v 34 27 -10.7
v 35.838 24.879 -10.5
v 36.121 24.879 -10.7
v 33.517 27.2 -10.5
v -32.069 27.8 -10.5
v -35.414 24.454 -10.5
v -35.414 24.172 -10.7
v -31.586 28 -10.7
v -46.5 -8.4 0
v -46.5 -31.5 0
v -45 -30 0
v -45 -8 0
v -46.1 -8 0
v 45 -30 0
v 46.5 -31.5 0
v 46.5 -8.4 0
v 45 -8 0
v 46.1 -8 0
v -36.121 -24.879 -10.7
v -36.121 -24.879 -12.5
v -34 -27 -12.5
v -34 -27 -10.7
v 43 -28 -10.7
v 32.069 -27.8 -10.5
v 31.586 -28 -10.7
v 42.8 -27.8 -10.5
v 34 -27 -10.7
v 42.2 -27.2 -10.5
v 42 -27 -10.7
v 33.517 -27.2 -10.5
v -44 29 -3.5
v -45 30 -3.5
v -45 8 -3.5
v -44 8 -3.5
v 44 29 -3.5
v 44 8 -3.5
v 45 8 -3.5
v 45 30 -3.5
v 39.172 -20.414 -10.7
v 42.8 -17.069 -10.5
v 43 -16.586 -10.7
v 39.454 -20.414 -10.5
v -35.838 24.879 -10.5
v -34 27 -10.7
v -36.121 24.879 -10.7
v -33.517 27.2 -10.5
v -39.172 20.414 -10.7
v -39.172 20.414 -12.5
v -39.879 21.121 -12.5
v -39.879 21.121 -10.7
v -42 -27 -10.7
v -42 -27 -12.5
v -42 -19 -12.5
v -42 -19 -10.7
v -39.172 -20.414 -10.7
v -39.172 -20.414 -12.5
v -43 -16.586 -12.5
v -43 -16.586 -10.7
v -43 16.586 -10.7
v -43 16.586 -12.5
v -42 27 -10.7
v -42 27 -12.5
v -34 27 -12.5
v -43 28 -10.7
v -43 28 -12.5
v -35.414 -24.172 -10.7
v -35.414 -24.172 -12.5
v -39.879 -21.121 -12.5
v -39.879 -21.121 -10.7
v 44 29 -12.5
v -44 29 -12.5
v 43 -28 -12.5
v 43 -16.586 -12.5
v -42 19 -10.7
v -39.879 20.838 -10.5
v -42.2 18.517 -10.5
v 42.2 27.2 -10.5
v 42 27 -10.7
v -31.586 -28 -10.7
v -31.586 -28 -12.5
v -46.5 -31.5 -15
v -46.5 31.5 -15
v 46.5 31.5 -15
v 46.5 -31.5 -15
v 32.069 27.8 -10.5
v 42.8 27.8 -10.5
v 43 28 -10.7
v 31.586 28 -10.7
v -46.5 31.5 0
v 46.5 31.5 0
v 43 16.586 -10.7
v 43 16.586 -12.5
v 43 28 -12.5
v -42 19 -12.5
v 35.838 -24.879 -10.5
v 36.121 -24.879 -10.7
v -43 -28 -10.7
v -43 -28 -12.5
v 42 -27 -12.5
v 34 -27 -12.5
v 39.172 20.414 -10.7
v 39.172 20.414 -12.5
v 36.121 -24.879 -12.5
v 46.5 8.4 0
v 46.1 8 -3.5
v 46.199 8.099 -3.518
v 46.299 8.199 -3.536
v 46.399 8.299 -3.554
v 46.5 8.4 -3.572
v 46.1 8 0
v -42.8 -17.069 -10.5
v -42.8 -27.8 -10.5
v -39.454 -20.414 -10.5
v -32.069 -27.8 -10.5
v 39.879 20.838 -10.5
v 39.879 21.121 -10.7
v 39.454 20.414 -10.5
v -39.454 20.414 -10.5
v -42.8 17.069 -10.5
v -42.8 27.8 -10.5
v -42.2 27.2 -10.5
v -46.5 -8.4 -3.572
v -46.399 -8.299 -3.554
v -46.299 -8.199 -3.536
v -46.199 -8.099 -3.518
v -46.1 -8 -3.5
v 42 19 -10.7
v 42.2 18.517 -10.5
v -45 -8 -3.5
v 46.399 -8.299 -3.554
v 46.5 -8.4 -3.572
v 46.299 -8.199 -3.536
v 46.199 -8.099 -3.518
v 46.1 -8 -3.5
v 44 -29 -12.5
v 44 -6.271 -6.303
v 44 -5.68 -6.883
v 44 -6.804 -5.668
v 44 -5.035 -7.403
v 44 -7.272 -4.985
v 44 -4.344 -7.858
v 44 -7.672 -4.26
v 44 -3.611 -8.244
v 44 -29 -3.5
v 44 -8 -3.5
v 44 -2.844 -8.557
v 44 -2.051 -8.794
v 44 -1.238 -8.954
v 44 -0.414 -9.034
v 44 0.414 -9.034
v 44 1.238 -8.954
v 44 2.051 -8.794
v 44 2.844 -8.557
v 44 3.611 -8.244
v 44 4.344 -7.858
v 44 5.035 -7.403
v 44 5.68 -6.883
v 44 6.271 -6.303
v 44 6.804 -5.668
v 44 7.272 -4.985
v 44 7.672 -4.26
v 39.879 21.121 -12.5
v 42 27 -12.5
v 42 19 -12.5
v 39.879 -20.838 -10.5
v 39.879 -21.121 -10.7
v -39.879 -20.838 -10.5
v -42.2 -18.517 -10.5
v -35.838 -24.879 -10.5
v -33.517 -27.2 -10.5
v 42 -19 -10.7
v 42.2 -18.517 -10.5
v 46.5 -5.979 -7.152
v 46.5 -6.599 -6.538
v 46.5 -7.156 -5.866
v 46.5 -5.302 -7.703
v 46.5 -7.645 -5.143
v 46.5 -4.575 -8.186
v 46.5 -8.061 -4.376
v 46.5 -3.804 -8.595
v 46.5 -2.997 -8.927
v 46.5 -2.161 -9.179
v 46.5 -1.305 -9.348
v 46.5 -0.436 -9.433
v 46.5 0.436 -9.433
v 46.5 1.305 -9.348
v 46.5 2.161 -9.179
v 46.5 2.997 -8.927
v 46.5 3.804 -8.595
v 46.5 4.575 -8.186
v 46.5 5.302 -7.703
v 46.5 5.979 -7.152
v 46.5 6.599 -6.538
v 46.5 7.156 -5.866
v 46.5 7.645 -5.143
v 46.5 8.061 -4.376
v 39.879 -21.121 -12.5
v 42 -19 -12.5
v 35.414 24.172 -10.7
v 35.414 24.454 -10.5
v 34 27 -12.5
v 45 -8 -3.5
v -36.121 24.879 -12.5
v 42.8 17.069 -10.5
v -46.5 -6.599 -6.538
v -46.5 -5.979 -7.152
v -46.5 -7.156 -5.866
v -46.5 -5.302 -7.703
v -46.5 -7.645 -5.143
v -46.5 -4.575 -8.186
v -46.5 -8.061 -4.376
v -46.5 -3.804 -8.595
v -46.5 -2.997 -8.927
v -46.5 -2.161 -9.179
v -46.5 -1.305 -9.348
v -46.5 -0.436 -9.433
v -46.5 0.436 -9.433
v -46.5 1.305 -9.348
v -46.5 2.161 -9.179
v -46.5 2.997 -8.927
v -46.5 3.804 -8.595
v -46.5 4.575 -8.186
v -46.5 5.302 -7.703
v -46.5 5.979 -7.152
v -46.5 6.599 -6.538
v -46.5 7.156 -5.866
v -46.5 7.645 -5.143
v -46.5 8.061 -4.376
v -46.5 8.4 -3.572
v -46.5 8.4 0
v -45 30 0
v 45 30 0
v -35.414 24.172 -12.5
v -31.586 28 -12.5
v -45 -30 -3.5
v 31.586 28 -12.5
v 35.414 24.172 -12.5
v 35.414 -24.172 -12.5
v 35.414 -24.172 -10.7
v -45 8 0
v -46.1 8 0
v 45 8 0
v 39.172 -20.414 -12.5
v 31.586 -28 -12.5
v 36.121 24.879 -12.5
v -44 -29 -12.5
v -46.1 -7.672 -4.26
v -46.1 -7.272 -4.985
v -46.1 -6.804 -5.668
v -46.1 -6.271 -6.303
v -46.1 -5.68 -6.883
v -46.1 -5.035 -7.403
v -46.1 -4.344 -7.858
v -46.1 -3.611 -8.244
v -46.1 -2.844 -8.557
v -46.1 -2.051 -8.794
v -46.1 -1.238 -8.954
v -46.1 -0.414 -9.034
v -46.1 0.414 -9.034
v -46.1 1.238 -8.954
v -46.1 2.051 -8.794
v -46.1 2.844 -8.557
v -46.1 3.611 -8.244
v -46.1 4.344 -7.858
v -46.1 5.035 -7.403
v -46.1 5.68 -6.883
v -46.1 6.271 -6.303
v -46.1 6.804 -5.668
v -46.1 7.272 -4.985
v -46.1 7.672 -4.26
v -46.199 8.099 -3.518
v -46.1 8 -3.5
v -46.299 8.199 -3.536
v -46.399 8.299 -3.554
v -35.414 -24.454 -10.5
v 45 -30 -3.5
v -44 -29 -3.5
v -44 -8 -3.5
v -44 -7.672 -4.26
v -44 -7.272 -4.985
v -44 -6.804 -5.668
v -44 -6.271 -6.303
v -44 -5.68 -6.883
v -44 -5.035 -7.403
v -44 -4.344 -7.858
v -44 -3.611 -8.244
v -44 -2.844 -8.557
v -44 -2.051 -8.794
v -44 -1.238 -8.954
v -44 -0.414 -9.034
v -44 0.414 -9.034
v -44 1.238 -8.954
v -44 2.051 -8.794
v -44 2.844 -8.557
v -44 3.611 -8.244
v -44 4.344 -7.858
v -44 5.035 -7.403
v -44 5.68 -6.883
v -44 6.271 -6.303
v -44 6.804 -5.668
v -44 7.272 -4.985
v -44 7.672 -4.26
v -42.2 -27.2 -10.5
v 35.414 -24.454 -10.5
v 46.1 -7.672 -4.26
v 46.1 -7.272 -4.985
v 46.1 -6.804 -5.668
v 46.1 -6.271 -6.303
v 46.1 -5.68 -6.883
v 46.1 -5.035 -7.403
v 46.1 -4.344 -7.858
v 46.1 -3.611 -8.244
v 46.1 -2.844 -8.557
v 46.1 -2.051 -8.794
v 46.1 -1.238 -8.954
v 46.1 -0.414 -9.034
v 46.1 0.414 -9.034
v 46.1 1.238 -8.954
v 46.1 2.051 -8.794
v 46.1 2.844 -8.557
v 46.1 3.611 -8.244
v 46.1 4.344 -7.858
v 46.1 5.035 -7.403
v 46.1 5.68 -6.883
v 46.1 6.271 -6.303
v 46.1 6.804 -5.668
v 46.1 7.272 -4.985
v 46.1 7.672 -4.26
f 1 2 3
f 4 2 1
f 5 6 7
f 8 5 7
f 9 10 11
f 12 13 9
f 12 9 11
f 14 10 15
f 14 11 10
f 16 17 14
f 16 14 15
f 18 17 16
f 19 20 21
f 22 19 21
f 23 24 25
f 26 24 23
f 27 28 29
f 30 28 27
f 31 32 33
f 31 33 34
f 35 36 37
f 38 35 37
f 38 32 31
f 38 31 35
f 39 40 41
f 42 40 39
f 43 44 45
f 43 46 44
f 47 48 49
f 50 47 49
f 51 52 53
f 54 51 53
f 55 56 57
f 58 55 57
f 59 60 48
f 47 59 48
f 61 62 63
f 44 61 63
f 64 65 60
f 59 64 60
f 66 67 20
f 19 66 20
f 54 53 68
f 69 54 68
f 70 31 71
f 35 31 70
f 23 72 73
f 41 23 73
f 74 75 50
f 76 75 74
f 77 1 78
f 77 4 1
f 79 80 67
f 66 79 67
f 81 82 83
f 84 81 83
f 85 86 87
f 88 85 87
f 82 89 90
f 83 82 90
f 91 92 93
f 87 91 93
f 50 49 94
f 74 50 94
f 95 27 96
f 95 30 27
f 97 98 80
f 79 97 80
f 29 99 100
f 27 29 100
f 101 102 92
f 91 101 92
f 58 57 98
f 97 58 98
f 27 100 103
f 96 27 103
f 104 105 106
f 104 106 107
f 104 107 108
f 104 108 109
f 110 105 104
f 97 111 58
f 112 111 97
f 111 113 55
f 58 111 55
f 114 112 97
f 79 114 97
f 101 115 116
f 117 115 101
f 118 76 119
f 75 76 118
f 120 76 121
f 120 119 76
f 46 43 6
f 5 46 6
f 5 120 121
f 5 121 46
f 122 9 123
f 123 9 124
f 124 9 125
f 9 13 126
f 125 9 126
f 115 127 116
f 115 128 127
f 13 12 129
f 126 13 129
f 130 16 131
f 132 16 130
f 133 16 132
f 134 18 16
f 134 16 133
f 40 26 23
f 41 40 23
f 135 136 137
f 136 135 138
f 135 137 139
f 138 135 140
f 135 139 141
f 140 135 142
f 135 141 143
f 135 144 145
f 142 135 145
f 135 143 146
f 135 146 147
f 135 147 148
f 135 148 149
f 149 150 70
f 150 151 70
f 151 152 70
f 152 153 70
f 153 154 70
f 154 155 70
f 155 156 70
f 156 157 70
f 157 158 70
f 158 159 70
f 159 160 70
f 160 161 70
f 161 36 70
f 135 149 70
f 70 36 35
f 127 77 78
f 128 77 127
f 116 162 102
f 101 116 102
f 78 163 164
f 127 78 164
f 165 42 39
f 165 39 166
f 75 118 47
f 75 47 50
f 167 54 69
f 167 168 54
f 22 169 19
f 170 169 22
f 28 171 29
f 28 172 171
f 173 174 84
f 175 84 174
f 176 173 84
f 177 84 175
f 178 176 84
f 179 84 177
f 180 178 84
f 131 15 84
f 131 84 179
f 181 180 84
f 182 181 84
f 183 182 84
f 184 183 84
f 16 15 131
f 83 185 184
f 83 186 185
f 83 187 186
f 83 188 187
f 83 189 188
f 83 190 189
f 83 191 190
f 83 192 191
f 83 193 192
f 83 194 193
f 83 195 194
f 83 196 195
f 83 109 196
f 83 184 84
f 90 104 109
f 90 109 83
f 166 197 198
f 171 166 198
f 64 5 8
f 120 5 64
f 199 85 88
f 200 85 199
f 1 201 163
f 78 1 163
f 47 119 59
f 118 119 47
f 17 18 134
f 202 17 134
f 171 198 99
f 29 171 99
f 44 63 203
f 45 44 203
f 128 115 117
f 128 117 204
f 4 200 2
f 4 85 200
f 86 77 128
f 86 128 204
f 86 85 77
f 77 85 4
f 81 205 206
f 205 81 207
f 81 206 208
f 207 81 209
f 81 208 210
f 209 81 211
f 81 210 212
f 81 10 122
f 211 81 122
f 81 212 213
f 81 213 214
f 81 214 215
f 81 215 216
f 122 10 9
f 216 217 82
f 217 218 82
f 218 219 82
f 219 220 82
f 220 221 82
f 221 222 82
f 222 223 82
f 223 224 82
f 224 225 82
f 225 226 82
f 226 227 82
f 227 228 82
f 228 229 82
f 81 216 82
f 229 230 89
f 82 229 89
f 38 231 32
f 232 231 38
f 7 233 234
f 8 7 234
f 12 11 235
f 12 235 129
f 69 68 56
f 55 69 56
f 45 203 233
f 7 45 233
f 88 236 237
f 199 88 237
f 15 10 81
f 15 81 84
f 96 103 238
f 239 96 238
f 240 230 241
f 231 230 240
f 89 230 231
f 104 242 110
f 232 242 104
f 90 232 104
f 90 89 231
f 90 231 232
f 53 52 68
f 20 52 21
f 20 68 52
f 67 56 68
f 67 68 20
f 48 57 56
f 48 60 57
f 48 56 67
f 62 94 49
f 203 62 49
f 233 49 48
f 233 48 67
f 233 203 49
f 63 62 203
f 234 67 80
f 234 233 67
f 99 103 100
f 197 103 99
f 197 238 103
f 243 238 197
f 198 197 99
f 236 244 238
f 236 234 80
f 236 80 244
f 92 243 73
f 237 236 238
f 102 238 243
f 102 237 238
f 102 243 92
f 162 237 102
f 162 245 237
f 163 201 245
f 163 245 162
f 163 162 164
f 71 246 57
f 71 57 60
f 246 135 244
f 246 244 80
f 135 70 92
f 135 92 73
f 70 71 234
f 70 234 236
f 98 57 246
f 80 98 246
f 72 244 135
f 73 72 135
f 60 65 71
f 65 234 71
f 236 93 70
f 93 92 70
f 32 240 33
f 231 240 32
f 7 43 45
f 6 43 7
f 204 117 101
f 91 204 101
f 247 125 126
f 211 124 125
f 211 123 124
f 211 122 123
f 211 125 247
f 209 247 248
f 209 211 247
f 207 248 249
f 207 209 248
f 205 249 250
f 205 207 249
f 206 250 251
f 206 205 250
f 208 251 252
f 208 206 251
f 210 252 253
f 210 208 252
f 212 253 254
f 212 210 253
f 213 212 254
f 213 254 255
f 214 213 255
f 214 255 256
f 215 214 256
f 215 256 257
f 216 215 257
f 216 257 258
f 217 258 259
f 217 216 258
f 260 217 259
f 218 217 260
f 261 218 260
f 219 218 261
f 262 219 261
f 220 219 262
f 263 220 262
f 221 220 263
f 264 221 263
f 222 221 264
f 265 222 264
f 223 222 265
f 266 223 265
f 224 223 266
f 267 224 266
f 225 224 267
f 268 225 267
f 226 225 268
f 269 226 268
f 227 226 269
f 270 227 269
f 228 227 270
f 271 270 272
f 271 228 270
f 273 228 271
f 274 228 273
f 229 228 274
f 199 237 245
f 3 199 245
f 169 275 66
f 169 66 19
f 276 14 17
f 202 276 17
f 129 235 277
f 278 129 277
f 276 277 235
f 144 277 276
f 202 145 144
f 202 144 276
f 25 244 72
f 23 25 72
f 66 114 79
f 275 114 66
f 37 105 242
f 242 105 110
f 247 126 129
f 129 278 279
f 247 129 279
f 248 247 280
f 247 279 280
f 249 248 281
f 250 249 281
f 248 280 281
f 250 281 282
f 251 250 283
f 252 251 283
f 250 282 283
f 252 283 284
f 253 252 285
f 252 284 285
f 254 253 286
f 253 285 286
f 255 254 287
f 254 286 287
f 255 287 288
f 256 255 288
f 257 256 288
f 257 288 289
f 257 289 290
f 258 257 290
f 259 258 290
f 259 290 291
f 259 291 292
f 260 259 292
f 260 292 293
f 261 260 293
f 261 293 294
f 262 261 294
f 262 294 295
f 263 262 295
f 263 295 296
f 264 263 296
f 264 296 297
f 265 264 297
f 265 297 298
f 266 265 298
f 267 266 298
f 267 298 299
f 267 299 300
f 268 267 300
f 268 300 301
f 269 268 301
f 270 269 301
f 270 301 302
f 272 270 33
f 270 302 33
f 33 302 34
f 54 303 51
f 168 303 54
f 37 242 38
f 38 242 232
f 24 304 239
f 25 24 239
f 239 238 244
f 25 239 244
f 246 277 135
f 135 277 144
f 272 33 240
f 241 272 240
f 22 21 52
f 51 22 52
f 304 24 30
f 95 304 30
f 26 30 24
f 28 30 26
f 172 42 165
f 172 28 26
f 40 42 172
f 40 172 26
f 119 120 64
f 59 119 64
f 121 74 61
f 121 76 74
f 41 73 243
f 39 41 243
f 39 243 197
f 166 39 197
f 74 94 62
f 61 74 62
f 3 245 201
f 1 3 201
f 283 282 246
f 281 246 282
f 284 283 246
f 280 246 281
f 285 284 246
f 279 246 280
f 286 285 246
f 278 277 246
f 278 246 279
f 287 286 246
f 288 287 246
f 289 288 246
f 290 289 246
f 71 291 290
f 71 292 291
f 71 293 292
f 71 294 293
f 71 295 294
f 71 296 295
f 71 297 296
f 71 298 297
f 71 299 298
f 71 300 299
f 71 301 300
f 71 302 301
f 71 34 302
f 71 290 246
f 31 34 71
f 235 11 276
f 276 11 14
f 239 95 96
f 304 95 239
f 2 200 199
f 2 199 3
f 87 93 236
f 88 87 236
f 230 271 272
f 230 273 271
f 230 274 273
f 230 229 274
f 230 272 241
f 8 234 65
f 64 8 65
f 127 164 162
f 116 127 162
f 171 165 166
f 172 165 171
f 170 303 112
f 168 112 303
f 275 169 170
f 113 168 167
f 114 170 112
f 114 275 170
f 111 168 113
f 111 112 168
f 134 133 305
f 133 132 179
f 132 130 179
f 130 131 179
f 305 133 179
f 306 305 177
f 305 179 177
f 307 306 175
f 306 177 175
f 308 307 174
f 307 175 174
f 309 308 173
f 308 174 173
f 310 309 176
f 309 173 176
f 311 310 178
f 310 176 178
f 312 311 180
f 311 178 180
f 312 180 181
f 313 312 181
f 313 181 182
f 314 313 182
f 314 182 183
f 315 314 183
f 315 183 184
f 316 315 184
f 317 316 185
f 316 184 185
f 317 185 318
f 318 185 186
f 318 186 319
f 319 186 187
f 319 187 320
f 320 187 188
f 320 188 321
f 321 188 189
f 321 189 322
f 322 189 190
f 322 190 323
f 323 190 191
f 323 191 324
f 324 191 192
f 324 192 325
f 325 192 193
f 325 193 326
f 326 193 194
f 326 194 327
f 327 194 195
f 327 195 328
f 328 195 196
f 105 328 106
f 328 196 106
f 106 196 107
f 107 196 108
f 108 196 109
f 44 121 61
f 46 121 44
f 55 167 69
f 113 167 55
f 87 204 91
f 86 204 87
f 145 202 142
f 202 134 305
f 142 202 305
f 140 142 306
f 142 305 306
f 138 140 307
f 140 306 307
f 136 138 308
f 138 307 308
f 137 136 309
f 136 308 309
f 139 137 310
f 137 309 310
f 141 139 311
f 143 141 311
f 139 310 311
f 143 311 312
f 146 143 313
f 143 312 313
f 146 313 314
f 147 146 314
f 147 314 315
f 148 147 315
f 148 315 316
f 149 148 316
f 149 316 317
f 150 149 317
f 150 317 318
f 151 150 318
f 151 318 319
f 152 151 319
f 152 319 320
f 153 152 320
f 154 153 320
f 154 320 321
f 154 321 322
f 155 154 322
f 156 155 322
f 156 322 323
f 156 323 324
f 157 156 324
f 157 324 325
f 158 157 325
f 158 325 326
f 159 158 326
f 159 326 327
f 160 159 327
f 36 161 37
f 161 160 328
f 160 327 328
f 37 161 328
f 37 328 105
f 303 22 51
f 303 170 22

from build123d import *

# Parameters (mm, degrees)
F0_W     = 93
F0_H     = 63
F1_DEPTH = 15
F2_T     = -2.5
F3_W     = 90
F3_H     = 60
F4_DEPTH = 3.5
F6_DEPTH = 2
F7_SIZE  = 0.2
F9_DEPTH = 93.001
F10_SIZE = 0.4


with BuildPart() as f1:
    # F0 (on Top) → F1 (new body)
    with BuildSketch(Plane.XY):
        Rectangle(F0_W, F0_H)
    extrude(amount=-F1_DEPTH)

    # F2
    f2_openings = [f1.faces().sort_by_distance(p)[0] for p in [
        (0, 0, 0),
    ]]
    offset(amount=F2_T, openings=f2_openings)

    # F3 (on Top) → F4 (cut)
    with BuildSketch(Plane.XY):
        Rectangle(F3_W, F3_H)
    extrude(amount=-F4_DEPTH, mode=Mode.SUBTRACT)

    # F5 (on face) → F6 (join)
    with BuildSketch(Plane.XY.offset(-12.5)):
        Polygon((-42, 19), (-42, 27), (-34, 27), (-36.1213203436, 24.8786796564), (-35.4142135624, 24.1715728753), (-31.5857864376, 28), (-43, 28), (-43, 16.5857864376), (-39.1715728753, 20.4142135624), (-39.8786796564, 21.1213203436), align=None)
        Polygon((34, 27), (42, 27), (42, 19), (39.8786796564, 21.1213203436), (39.1715728753, 20.4142135624), (43, 16.5857864376), (43, 28), (31.5857864376, 28), (35.4142135624, 24.1715728753), (36.1213203436, 24.8786796564), align=None)
        Polygon((-43, -16.5857864376), (-43, -28), (-31.5857864376, -28), (-35.4142135624, -24.1715728753), (-36.1213203436, -24.8786796564), (-34, -27), (-42, -27), (-42, -19), (-39.8786796564, -21.1213203436), (-39.1715728753, -20.4142135624), align=None)
        Polygon((31.5857864376, -28), (43, -28), (43, -16.5857864376), (39.1715728753, -20.4142135624), (39.8786796564, -21.1213203436), (42, -19), (42, -27), (34, -27), (36.1213203436, -24.8786796564), (35.4142135624, -24.1715728753), align=None)
    extrude(amount=F6_DEPTH)

    # F7
    f7_edges = [f1.edges().sort_by_distance(p)[0] for p in [
        (-39.525126, 20.767767, -10.5),
        (-40.93934, 20.06066, -10.5),
        (-42, 23, -10.5),
        (-38, 27, -10.5),
        (-35.06066, 25.93934, -10.5),
        (-35.767767, 24.525126, -10.5),
        (-33.5, 26.085786, -10.5),
        (-37.292893, 28, -10.5),
        (-43, 22.292893, -10.5),
        (-41.085786, 18.5, -10.5),
        (35.767767, 24.525126, -10.5),
        (35.06066, 25.93934, -10.5),
        (38, 27, -10.5),
        (42, 23, -10.5),
        (40.93934, 20.06066, -10.5),
        (39.525126, 20.767767, -10.5),
        (41.085786, 18.5, -10.5),
        (43, 22.292893, -10.5),
        (37.292893, 28, -10.5),
        (33.5, 26.085786, -10.5),
        (33.5, -26.085786, -10.5),
        (37.292893, -28, -10.5),
        (43, -22.292893, -10.5),
        (41.085786, -18.5, -10.5),
        (39.525126, -20.767767, -10.5),
        (40.93934, -20.06066, -10.5),
        (42, -23, -10.5),
        (38, -27, -10.5),
        (35.06066, -25.93934, -10.5),
        (35.767767, -24.525126, -10.5),
        (-41.085786, -18.5, -10.5),
        (-43, -22.292893, -10.5),
        (-37.292893, -28, -10.5),
        (-33.5, -26.085786, -10.5),
        (-35.767767, -24.525126, -10.5),
        (-35.06066, -25.93934, -10.5),
        (-38, -27, -10.5),
        (-42, -23, -10.5),
        (-40.93934, -20.06066, -10.5),
        (-39.525126, -20.767767, -10.5),
    ]]
    chamfer(f7_edges, length=F7_SIZE)

    # F8 (on face) → F9 (cut, through all)
    with BuildSketch(Plane.YZ.offset(46.5)):
        with BuildLine():
            Line((-8, 0), (-8, -3.5))
            ThreePointArc((-8, -3.5), (0, -9.0440037453), (8, -3.5))
            Line((8, -3.5), (8, 0))
            Line((8, 0), (0, 0))
            Line((0, 0), (-8, 0))
        make_face()
    extrude(amount=-F9_DEPTH, mode=Mode.SUBTRACT)

    # F10
    f10_edges = [f1.edges().sort_by_distance(p)[0] for p in [
        (46.5, 0, -9.044004),
        (46.5, 8, -1.75),
        (46.5, -8, -1.75),
        (-46.5, 8, -1.75),
        (-46.5, 0, -9.044004),
        (-46.5, -8, -1.75),
    ]]
    chamfer(f10_edges, length=F10_SIZE)


solid = f1.part
